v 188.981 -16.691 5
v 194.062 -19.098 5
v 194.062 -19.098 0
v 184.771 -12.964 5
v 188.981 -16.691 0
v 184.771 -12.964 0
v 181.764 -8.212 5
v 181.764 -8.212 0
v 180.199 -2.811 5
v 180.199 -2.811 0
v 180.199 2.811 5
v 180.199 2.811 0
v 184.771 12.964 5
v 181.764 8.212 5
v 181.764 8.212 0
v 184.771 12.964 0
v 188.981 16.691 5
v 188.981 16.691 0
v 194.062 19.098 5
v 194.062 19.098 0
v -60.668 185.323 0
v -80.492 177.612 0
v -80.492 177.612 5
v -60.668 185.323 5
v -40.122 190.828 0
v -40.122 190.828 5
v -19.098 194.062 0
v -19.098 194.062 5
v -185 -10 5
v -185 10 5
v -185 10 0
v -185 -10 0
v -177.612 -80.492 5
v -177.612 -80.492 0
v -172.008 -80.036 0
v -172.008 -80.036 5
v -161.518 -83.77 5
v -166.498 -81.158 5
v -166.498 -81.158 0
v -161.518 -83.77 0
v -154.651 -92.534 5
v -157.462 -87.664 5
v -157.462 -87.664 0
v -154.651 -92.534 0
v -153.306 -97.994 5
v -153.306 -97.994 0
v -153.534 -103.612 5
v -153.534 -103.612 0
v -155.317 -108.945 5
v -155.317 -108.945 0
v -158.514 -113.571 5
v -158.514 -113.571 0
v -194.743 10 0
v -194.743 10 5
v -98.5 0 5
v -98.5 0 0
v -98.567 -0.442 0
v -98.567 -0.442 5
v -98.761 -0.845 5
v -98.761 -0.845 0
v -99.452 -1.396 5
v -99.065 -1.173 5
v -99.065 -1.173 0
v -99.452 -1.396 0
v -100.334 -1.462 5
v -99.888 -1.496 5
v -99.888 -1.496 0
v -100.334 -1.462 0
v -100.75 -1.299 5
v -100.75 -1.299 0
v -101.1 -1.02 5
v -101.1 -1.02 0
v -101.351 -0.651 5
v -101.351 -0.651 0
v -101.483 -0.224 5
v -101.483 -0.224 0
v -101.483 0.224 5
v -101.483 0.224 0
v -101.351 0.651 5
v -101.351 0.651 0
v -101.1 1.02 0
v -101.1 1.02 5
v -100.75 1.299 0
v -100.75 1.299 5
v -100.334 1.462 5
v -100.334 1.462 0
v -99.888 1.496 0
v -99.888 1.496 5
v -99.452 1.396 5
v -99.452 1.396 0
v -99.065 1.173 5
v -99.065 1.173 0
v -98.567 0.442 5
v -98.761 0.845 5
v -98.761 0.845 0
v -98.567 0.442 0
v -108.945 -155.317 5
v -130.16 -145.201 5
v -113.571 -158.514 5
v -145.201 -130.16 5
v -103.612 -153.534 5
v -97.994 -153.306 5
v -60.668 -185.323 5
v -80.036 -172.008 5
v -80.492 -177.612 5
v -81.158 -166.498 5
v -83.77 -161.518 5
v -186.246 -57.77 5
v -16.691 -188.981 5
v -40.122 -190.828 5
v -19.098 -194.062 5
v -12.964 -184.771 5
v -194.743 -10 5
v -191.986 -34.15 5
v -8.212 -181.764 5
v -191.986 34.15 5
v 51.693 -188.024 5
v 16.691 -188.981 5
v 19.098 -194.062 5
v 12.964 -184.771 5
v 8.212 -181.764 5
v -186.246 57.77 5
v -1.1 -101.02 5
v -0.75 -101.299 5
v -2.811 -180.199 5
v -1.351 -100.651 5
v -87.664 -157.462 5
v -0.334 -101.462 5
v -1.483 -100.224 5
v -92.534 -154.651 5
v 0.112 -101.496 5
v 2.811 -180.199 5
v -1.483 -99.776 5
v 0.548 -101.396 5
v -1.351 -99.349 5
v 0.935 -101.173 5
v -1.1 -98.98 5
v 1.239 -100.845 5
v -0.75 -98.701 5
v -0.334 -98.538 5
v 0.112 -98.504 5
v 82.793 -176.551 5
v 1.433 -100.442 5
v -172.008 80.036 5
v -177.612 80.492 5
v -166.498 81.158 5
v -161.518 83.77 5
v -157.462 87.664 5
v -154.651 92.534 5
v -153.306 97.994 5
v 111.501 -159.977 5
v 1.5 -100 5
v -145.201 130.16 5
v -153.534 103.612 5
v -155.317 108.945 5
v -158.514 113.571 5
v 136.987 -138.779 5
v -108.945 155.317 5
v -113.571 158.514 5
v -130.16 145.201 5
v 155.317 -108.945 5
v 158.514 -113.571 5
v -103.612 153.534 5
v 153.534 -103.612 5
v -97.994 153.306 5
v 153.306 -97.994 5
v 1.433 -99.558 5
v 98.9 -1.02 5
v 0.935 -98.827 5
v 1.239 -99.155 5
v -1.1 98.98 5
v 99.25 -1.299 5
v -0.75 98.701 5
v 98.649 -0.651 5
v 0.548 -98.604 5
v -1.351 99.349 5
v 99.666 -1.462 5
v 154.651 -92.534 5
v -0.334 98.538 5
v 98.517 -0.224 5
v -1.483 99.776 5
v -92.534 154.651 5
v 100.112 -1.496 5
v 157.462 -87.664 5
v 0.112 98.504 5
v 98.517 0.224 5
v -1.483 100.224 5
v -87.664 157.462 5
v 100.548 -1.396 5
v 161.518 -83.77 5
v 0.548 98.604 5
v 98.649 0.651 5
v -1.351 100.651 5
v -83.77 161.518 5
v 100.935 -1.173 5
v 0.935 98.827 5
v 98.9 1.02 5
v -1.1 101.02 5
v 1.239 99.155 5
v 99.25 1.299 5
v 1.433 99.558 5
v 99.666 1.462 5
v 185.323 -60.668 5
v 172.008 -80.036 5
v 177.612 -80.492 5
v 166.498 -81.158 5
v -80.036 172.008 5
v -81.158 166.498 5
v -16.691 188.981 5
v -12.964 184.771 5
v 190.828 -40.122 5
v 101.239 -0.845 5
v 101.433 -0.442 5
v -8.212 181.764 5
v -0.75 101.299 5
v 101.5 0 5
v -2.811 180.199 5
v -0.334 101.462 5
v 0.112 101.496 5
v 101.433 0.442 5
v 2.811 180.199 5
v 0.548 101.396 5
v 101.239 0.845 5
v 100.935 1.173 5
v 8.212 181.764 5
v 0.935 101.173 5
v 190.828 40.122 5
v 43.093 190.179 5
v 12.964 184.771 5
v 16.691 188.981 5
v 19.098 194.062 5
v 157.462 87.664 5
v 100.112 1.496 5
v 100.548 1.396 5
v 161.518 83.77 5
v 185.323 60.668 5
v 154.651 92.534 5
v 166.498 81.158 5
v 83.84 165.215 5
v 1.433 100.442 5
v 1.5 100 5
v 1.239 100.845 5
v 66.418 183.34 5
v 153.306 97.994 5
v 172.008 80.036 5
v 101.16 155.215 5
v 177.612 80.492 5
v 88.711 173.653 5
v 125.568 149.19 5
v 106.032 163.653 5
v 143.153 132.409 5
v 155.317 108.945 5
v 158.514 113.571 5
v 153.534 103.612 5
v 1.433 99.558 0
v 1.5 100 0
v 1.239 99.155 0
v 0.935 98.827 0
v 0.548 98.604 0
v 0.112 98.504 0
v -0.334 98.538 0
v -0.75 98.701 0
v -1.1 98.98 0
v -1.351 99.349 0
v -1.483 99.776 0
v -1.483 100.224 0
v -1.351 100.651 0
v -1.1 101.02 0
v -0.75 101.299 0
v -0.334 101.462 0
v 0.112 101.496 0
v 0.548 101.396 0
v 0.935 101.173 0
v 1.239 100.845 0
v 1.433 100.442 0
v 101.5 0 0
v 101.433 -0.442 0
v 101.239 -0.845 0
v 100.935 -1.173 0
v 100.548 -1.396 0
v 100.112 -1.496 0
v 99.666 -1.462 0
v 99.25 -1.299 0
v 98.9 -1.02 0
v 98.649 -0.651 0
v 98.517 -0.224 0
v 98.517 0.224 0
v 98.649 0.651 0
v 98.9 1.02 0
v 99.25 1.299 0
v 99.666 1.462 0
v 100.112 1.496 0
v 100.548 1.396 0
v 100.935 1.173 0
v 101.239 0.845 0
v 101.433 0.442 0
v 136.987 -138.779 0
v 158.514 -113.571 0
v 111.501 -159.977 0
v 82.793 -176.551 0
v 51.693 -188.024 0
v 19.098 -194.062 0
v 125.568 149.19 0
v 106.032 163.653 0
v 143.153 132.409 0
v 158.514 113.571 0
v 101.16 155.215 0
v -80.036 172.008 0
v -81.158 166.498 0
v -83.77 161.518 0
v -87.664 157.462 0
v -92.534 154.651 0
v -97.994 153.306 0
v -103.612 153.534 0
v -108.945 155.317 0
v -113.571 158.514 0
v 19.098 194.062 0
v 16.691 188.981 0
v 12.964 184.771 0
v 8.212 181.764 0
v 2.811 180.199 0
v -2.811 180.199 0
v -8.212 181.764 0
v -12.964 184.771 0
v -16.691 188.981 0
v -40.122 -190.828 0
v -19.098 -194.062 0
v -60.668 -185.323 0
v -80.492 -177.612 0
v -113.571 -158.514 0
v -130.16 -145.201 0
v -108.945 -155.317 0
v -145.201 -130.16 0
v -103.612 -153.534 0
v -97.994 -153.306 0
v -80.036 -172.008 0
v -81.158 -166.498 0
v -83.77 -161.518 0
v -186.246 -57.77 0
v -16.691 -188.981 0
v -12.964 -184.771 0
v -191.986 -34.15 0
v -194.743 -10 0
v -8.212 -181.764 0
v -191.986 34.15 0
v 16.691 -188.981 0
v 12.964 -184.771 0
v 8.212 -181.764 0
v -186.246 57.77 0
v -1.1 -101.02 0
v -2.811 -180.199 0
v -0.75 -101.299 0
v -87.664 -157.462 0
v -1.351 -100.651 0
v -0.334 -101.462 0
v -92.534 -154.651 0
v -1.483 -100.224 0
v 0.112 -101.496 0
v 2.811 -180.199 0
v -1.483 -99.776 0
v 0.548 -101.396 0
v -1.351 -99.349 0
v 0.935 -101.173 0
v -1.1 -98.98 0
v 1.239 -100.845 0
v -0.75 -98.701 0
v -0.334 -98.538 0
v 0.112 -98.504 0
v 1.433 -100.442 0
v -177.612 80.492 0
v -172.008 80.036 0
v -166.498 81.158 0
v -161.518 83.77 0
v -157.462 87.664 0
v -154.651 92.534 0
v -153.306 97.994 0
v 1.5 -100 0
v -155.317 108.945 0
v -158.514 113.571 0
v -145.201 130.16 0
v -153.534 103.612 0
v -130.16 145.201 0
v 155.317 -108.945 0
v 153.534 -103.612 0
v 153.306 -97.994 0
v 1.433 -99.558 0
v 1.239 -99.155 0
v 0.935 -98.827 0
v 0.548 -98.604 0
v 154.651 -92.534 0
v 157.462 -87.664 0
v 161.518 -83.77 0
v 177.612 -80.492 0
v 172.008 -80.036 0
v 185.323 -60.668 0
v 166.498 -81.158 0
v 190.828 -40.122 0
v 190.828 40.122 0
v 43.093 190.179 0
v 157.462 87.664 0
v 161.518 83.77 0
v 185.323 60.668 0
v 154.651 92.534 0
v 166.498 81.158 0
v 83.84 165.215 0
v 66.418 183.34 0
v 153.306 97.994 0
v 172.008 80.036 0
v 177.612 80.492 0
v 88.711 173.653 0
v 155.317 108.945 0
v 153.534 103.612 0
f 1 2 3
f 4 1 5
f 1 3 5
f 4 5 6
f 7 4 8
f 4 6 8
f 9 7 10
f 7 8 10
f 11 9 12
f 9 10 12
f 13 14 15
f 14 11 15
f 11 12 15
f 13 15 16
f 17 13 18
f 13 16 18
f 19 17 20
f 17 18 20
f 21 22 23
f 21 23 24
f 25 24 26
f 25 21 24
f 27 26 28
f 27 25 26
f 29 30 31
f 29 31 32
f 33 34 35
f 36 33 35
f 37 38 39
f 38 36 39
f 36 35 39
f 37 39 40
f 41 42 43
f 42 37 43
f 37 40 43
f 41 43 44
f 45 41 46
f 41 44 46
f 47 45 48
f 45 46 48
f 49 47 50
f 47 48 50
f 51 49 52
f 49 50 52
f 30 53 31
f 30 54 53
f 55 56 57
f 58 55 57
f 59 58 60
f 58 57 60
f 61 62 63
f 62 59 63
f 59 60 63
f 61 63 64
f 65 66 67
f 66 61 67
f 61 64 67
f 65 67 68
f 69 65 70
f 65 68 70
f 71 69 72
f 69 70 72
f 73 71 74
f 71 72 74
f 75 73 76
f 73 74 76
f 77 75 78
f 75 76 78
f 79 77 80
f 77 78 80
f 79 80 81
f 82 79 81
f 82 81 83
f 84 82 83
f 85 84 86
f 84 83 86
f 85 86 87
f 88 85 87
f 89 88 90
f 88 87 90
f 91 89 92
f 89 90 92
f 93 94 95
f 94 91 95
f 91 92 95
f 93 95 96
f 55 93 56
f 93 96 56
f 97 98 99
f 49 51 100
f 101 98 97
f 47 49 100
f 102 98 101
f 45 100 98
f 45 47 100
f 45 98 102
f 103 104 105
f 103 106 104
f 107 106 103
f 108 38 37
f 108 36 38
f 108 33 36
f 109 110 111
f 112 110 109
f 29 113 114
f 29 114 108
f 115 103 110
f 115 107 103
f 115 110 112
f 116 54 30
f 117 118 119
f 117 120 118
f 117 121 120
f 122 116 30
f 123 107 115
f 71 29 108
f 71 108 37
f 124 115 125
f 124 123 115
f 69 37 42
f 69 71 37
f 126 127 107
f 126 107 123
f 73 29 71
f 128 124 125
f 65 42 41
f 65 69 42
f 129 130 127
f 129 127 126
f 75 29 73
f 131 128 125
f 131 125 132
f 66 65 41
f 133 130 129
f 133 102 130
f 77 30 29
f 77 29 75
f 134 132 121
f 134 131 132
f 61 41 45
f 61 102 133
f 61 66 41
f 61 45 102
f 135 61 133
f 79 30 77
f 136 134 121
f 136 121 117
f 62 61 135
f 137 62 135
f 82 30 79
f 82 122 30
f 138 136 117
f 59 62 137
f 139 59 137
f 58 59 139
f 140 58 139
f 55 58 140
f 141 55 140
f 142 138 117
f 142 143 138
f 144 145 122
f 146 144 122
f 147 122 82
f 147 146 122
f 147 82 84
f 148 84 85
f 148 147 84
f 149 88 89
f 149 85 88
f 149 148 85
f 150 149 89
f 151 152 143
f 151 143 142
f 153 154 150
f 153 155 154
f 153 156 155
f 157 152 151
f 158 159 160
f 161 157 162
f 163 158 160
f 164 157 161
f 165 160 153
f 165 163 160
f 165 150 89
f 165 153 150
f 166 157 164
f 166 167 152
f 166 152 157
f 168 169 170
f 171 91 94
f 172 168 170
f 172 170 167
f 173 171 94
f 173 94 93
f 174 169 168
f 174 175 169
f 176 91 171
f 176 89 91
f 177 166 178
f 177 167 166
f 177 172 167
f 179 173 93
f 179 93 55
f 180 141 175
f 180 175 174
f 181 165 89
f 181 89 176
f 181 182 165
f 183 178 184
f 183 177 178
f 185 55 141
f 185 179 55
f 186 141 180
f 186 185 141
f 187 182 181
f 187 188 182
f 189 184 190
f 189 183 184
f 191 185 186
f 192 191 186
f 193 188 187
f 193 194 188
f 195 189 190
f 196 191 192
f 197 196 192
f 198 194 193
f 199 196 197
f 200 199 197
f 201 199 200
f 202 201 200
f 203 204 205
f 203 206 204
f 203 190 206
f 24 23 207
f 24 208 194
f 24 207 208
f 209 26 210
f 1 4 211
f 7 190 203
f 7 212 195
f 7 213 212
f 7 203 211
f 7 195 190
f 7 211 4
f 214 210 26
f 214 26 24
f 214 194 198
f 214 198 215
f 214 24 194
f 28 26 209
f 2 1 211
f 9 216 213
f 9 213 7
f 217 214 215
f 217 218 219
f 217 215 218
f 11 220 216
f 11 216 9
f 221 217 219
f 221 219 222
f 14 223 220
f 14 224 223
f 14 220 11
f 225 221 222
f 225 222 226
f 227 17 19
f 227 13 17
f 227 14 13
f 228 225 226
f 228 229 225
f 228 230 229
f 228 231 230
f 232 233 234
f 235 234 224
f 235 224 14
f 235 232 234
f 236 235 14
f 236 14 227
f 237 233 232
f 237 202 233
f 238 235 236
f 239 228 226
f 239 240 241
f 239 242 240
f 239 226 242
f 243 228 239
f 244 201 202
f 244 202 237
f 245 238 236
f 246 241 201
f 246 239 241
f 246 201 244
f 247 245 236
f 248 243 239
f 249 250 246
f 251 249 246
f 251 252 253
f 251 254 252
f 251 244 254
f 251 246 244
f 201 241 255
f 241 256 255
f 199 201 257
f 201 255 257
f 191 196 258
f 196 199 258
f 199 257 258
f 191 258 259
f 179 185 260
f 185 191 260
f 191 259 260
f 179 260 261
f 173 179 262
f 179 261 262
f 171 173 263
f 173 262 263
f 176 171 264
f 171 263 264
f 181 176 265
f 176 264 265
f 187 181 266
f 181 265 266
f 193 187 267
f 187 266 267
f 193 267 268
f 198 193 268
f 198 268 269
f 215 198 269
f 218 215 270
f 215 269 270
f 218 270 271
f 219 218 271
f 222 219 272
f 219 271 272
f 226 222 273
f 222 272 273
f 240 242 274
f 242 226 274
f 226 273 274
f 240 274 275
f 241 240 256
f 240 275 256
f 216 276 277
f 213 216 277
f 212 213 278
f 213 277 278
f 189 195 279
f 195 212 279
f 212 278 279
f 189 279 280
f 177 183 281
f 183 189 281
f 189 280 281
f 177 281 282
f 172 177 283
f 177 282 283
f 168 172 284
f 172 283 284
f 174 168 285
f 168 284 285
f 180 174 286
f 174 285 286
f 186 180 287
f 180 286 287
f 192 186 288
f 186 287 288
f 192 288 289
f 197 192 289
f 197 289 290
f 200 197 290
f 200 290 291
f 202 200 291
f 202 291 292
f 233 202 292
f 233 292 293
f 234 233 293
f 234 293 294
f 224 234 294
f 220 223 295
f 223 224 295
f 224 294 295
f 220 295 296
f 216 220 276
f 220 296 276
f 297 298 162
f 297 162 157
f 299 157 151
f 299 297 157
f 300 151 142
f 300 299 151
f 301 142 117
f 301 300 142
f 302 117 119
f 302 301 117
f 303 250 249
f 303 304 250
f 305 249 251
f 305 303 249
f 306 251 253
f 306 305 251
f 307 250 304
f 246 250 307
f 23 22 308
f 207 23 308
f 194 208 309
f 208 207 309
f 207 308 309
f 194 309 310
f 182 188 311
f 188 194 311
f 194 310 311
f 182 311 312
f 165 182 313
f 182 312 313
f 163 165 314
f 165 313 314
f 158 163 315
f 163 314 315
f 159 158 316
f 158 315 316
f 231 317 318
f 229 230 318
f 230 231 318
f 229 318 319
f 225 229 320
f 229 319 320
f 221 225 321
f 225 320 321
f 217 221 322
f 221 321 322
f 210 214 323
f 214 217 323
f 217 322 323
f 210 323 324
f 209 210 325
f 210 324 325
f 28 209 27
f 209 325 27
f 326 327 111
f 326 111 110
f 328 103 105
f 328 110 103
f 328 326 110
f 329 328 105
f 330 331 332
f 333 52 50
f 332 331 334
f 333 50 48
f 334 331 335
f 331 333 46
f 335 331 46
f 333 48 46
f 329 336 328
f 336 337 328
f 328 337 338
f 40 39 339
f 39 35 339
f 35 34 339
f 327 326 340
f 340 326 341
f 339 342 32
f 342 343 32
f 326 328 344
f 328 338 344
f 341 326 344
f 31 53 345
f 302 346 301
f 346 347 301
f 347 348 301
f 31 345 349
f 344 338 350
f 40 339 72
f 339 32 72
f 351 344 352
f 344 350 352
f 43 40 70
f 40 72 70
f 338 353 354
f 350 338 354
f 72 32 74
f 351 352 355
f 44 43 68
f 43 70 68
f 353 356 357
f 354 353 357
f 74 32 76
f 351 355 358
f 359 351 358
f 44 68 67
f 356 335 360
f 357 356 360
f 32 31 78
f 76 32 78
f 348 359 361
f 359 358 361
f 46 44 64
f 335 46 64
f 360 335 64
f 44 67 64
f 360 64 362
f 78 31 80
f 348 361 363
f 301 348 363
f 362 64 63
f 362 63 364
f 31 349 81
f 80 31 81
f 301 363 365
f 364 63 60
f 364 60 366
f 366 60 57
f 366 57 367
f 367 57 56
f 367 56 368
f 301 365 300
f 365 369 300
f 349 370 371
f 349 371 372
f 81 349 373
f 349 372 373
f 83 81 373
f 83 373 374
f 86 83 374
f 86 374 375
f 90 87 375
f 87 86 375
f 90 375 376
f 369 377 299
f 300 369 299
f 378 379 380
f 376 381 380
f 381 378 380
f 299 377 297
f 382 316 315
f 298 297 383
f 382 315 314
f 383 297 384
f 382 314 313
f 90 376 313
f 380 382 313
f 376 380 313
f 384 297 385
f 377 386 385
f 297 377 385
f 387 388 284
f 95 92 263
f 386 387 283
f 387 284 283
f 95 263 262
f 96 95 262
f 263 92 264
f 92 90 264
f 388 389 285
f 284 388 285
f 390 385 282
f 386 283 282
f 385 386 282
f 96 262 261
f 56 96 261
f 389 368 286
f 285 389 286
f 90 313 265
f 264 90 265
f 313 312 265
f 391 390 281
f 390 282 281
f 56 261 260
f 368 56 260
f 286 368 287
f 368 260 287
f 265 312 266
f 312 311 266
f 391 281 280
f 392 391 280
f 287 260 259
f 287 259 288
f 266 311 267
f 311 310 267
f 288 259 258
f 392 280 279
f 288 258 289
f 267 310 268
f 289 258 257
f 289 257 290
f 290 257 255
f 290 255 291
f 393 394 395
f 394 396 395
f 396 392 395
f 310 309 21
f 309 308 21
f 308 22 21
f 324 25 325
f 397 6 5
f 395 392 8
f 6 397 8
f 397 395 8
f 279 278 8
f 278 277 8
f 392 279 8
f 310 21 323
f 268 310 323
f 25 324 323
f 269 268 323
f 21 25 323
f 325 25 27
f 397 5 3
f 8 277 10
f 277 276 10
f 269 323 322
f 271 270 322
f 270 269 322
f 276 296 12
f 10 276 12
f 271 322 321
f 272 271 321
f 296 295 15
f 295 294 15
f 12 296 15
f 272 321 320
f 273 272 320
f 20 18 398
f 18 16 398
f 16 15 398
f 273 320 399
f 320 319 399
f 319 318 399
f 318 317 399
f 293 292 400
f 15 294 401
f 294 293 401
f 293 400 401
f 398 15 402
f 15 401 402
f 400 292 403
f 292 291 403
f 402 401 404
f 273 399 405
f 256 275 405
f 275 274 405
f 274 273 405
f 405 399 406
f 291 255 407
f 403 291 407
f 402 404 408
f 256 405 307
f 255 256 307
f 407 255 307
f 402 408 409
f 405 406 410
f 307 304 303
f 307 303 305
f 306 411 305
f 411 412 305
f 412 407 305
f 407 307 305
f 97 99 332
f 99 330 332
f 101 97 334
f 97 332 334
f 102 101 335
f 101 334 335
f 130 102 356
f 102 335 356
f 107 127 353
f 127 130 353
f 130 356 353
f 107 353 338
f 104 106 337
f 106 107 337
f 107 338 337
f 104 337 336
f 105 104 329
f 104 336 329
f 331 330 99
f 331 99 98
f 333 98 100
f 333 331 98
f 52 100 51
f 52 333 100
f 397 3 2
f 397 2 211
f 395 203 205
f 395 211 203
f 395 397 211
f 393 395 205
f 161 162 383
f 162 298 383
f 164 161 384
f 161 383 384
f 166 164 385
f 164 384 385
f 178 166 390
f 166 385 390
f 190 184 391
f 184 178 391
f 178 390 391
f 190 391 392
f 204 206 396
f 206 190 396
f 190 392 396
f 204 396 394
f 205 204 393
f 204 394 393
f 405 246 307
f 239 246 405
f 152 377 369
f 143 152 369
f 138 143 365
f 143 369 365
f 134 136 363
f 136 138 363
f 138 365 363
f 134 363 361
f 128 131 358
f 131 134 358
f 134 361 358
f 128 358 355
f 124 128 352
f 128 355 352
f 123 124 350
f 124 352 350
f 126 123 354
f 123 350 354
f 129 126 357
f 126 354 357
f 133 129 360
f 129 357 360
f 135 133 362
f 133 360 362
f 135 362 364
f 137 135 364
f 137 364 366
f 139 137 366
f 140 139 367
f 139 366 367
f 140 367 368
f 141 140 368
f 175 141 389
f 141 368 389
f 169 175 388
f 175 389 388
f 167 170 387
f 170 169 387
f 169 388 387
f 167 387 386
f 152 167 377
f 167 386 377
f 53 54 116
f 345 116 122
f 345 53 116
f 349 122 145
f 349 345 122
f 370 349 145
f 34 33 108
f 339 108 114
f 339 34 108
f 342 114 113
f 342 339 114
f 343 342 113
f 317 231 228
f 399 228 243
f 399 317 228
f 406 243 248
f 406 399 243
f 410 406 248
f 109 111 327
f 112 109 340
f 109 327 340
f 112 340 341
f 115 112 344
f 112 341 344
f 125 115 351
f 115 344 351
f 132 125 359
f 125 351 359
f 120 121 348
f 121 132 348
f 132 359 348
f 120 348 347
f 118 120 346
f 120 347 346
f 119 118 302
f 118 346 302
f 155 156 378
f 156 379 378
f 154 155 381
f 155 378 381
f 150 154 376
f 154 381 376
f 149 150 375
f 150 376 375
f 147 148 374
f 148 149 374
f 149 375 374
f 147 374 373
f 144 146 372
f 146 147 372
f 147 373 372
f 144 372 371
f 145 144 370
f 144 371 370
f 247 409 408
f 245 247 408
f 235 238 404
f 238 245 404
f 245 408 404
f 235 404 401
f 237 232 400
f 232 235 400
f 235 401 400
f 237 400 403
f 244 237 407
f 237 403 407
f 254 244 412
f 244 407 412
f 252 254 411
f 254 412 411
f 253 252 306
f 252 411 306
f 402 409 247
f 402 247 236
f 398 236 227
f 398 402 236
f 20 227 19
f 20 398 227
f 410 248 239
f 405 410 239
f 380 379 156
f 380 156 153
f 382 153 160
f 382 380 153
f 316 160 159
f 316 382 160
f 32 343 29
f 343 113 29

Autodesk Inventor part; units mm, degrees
ref_plane "YZ Plane" through (0, 0, 0) normal (1, 0, 0) x (0, 1, 0)
ref_plane "XZ Plane" through (0, 0, 0) normal (0, 1, 0) x (-1, 0, 0)
ref_plane "XY Plane" through (0, 0, 0) normal (0, 0, 1) x (1, 0, 0)
sketch "Sketch1" plane through (0, 0, 0) normal (0, 0, 1) x (1, 0, 0)
  arc A0 (-19.0983, 194.0625) -> (19.0983, 194.0625) centre (0, 200) ccw
  arc A1 (-113.5709, 158.5139) -> (-80.4916, 177.6122) centre (-100, 173.2051) ccw
  arc A2 (-177.6122, 80.4916) -> (-158.5139, 113.5709) centre (-173.2051, 100) ccw
  arc A3 (-194.0625, -19.0983) -> (-194.0625, 19.0983) centre (-200, 0) ccw
  arc A4 (-158.5139, -113.5709) -> (-177.6122, -80.4916) centre (-173.2051, -100) ccw
  arc A5 (-80.4916, -177.6122) -> (-113.5709, -158.5139) centre (-100, -173.2051) ccw
  arc A6 (19.0983, -194.0625) -> (-19.0983, -194.0625) centre (0, -200) ccw
  arc A7 (113.5709, -158.5139) -> (80.4916, -177.6122) centre (100, -173.2051) ccw
  arc A8 (177.6122, -80.4916) -> (158.5139, -113.5709) centre (173.2051, -100) ccw
  arc A9 (194.0625, 19.0983) -> (194.0625, -19.0983) centre (200, 0) ccw
  arc A10 (158.5139, 113.5709) -> (177.6122, 80.4916) centre (173.2051, 100) ccw
  arc A11 (80.4916, 177.6122) -> (113.5709, 158.5139) centre (100, 173.2051) ccw
  arc A12 (-113.5709, 158.5139) -> (-158.5139, 113.5709) centre (0, 0) ccw
  arc A13 (-19.0983, 194.0625) -> (-80.4916, 177.6122) centre (0, 0) ccw
  arc A14 (158.5139, 113.5709) -> (19.0983, 194.0625) centre (0, 0) ccw
  arc A15 (194.0625, 19.0983) -> (177.6122, 80.4916) centre (0, 0) ccw
  arc A16 (177.6122, -80.4916) -> (194.0625, -19.0983) centre (0, 0) ccw
  arc A17 (19.0983, -194.0625) -> (158.5139, -113.5709) centre (0, 0) ccw
  arc A18 (-80.4916, -177.6122) -> (-19.0983, -194.0625) centre (0, 0) ccw
  arc A19 (-177.6122, 80.4916) -> (-177.6122, -80.4916) centre (0, 0) ccw
  arc A20 (-158.5139, -113.5709) -> (-113.5709, -158.5139) centre (0, 0) ccw
  line L0 (0, 0) -> (100, 0) construction
  circle A21 centre (-100, 0) radius 1.5
  circle A22 centre (0, -100) radius 1.5
  circle A23 centre (100, 0) radius 1.5
  circle A24 centre (0, 100) radius 1.5
  dimension "d4" = 40
  dimension "d5" = 360
  dimension "d9" = 3
  dimension "d12" = 360
extrude "Extrusion1" add sketch "Sketch1" along normal blind 5
sketch "Sketch2" plane through (0, 0, 5) normal (0, 0, 1) x (1, 0, 0)
  line L0 (0, 195) -> (10, 195)
  line L1 (10, 195) -> (10, 185)
  line L2 (10, 185) -> (0, 185)
  line L3 (0, 195) -> (-10, 195)
  line L4 (-10, 195) -> (-10, 185)
  line L5 (-10, 185) -> (0, 185)
  line L6 (-106.1603, 163.875) -> (-101.1603, 155.2147)
  line L7 (-97.5, 168.875) -> (-106.1603, 163.875)
  line L8 (-88.8397, 173.875) -> (-83.8397, 165.2147)
  line L9 (-97.5, 168.875) -> (-88.8397, 173.875)
  line L10 (-83.8397, 165.2147) -> (-92.5, 160.2147)
  line L11 (-101.1603, 155.2147) -> (-92.5, 160.2147)
  line L12 (-173.875, 88.8397) -> (-165.2147, 83.8397)
  line L13 (-168.875, 97.5) -> (-173.875, 88.8397)
  line L14 (-163.875, 106.1603) -> (-155.2147, 101.1603)
  line L15 (-168.875, 97.5) -> (-163.875, 106.1603)
  line L16 (-155.2147, 101.1603) -> (-160.2147, 92.5)
  line L17 (-165.2147, 83.8397) -> (-160.2147, 92.5)
  line L18 (-195, -10) -> (-185, -10)
  line L19 (-195, 0) -> (-195, -10)
  line L20 (-195, 10) -> (-185, 10)
  line L21 (-195, 0) -> (-195, 10)
  line L22 (-185, 10) -> (-185, 0)
  line L23 (-185, -10) -> (-185, 0)
  line L24 (-163.875, -106.1603) -> (-155.2147, -101.1603)
  line L25 (-168.875, -97.5) -> (-163.875, -106.1603)
  line L26 (-173.875, -88.8397) -> (-165.2147, -83.8397)
  line L27 (-168.875, -97.5) -> (-173.875, -88.8397)
  line L28 (-165.2147, -83.8397) -> (-160.2147, -92.5)
  line L29 (-155.2147, -101.1603) -> (-160.2147, -92.5)
  line L30 (-88.8397, -173.875) -> (-83.8397, -165.2147)
  line L31 (-97.5, -168.875) -> (-88.8397, -173.875)
  line L32 (-106.1603, -163.875) -> (-101.1603, -155.2147)
  line L33 (-97.5, -168.875) -> (-106.1603, -163.875)
  line L34 (-101.1603, -155.2147) -> (-92.5, -160.2147)
  line L35 (-83.8397, -165.2147) -> (-92.5, -160.2147)
  line L36 (10, -195) -> (10, -185)
  line L37 (0, -195) -> (10, -195)
  line L38 (-10, -195) -> (-10, -185)
  line L39 (0, -195) -> (-10, -195)
  line L40 (-10, -185) -> (0, -185)
  line L41 (10, -185) -> (0, -185)
  line L42 (106.1603, -163.875) -> (101.1603, -155.2147)
  line L43 (97.5, -168.875) -> (106.1603, -163.875)
  line L44 (88.8397, -173.875) -> (83.8397, -165.2147)
  line L45 (97.5, -168.875) -> (88.8397, -173.875)
  line L46 (83.8397, -165.2147) -> (92.5, -160.2147)
  line L47 (101.1603, -155.2147) -> (92.5, -160.2147)
  line L48 (173.875, -88.8397) -> (165.2147, -83.8397)
  line L49 (168.875, -97.5) -> (173.875, -88.8397)
  line L50 (163.875, -106.1603) -> (155.2147, -101.1603)
  line L51 (168.875, -97.5) -> (163.875, -106.1603)
  line L52 (155.2147, -101.1603) -> (160.2147, -92.5)
  line L53 (165.2147, -83.8397) -> (160.2147, -92.5)
  line L54 (195, 10) -> (185, 10)
  line L55 (195, 0) -> (195, 10)
  line L56 (195, -10) -> (185, -10)
  line L57 (195, 0) -> (195, -10)
  line L58 (185, -10) -> (185, 0)
  line L59 (185, 10) -> (185, 0)
  line L60 (163.875, 106.1603) -> (155.2147, 101.1603)
  line L61 (168.875, 97.5) -> (163.875, 106.1603)
  line L62 (173.875, 88.8397) -> (165.2147, 83.8397)
  line L63 (168.875, 97.5) -> (173.875, 88.8397)
  line L64 (165.2147, 83.8397) -> (160.2147, 92.5)
  line L65 (155.2147, 101.1603) -> (160.2147, 92.5)
  line L66 (88.8397, 173.875) -> (83.8397, 165.2147)
  line L67 (97.5, 168.875) -> (88.8397, 173.875)
  line L68 (106.1603, 163.875) -> (101.1603, 155.2147)
  line L69 (97.5, 168.875) -> (106.1603, 163.875)
  line L70 (101.1603, 155.2147) -> (92.5, 160.2147)
  line L71 (83.8397, 165.2147) -> (92.5, 160.2147)
  point P0 (0, 0)
  point P1 (0, 0)
  dimension "d16" = 10
  dimension "d17" = 10
  dimension "d20" = 360
extrude "Extrusion2" cut sketch "Sketch2" against normal blind 5 contours L19 L21 L20 L22 L23 L18 | L67 L69 L68 L70 L71 L66
properties part number "napduoinew"
